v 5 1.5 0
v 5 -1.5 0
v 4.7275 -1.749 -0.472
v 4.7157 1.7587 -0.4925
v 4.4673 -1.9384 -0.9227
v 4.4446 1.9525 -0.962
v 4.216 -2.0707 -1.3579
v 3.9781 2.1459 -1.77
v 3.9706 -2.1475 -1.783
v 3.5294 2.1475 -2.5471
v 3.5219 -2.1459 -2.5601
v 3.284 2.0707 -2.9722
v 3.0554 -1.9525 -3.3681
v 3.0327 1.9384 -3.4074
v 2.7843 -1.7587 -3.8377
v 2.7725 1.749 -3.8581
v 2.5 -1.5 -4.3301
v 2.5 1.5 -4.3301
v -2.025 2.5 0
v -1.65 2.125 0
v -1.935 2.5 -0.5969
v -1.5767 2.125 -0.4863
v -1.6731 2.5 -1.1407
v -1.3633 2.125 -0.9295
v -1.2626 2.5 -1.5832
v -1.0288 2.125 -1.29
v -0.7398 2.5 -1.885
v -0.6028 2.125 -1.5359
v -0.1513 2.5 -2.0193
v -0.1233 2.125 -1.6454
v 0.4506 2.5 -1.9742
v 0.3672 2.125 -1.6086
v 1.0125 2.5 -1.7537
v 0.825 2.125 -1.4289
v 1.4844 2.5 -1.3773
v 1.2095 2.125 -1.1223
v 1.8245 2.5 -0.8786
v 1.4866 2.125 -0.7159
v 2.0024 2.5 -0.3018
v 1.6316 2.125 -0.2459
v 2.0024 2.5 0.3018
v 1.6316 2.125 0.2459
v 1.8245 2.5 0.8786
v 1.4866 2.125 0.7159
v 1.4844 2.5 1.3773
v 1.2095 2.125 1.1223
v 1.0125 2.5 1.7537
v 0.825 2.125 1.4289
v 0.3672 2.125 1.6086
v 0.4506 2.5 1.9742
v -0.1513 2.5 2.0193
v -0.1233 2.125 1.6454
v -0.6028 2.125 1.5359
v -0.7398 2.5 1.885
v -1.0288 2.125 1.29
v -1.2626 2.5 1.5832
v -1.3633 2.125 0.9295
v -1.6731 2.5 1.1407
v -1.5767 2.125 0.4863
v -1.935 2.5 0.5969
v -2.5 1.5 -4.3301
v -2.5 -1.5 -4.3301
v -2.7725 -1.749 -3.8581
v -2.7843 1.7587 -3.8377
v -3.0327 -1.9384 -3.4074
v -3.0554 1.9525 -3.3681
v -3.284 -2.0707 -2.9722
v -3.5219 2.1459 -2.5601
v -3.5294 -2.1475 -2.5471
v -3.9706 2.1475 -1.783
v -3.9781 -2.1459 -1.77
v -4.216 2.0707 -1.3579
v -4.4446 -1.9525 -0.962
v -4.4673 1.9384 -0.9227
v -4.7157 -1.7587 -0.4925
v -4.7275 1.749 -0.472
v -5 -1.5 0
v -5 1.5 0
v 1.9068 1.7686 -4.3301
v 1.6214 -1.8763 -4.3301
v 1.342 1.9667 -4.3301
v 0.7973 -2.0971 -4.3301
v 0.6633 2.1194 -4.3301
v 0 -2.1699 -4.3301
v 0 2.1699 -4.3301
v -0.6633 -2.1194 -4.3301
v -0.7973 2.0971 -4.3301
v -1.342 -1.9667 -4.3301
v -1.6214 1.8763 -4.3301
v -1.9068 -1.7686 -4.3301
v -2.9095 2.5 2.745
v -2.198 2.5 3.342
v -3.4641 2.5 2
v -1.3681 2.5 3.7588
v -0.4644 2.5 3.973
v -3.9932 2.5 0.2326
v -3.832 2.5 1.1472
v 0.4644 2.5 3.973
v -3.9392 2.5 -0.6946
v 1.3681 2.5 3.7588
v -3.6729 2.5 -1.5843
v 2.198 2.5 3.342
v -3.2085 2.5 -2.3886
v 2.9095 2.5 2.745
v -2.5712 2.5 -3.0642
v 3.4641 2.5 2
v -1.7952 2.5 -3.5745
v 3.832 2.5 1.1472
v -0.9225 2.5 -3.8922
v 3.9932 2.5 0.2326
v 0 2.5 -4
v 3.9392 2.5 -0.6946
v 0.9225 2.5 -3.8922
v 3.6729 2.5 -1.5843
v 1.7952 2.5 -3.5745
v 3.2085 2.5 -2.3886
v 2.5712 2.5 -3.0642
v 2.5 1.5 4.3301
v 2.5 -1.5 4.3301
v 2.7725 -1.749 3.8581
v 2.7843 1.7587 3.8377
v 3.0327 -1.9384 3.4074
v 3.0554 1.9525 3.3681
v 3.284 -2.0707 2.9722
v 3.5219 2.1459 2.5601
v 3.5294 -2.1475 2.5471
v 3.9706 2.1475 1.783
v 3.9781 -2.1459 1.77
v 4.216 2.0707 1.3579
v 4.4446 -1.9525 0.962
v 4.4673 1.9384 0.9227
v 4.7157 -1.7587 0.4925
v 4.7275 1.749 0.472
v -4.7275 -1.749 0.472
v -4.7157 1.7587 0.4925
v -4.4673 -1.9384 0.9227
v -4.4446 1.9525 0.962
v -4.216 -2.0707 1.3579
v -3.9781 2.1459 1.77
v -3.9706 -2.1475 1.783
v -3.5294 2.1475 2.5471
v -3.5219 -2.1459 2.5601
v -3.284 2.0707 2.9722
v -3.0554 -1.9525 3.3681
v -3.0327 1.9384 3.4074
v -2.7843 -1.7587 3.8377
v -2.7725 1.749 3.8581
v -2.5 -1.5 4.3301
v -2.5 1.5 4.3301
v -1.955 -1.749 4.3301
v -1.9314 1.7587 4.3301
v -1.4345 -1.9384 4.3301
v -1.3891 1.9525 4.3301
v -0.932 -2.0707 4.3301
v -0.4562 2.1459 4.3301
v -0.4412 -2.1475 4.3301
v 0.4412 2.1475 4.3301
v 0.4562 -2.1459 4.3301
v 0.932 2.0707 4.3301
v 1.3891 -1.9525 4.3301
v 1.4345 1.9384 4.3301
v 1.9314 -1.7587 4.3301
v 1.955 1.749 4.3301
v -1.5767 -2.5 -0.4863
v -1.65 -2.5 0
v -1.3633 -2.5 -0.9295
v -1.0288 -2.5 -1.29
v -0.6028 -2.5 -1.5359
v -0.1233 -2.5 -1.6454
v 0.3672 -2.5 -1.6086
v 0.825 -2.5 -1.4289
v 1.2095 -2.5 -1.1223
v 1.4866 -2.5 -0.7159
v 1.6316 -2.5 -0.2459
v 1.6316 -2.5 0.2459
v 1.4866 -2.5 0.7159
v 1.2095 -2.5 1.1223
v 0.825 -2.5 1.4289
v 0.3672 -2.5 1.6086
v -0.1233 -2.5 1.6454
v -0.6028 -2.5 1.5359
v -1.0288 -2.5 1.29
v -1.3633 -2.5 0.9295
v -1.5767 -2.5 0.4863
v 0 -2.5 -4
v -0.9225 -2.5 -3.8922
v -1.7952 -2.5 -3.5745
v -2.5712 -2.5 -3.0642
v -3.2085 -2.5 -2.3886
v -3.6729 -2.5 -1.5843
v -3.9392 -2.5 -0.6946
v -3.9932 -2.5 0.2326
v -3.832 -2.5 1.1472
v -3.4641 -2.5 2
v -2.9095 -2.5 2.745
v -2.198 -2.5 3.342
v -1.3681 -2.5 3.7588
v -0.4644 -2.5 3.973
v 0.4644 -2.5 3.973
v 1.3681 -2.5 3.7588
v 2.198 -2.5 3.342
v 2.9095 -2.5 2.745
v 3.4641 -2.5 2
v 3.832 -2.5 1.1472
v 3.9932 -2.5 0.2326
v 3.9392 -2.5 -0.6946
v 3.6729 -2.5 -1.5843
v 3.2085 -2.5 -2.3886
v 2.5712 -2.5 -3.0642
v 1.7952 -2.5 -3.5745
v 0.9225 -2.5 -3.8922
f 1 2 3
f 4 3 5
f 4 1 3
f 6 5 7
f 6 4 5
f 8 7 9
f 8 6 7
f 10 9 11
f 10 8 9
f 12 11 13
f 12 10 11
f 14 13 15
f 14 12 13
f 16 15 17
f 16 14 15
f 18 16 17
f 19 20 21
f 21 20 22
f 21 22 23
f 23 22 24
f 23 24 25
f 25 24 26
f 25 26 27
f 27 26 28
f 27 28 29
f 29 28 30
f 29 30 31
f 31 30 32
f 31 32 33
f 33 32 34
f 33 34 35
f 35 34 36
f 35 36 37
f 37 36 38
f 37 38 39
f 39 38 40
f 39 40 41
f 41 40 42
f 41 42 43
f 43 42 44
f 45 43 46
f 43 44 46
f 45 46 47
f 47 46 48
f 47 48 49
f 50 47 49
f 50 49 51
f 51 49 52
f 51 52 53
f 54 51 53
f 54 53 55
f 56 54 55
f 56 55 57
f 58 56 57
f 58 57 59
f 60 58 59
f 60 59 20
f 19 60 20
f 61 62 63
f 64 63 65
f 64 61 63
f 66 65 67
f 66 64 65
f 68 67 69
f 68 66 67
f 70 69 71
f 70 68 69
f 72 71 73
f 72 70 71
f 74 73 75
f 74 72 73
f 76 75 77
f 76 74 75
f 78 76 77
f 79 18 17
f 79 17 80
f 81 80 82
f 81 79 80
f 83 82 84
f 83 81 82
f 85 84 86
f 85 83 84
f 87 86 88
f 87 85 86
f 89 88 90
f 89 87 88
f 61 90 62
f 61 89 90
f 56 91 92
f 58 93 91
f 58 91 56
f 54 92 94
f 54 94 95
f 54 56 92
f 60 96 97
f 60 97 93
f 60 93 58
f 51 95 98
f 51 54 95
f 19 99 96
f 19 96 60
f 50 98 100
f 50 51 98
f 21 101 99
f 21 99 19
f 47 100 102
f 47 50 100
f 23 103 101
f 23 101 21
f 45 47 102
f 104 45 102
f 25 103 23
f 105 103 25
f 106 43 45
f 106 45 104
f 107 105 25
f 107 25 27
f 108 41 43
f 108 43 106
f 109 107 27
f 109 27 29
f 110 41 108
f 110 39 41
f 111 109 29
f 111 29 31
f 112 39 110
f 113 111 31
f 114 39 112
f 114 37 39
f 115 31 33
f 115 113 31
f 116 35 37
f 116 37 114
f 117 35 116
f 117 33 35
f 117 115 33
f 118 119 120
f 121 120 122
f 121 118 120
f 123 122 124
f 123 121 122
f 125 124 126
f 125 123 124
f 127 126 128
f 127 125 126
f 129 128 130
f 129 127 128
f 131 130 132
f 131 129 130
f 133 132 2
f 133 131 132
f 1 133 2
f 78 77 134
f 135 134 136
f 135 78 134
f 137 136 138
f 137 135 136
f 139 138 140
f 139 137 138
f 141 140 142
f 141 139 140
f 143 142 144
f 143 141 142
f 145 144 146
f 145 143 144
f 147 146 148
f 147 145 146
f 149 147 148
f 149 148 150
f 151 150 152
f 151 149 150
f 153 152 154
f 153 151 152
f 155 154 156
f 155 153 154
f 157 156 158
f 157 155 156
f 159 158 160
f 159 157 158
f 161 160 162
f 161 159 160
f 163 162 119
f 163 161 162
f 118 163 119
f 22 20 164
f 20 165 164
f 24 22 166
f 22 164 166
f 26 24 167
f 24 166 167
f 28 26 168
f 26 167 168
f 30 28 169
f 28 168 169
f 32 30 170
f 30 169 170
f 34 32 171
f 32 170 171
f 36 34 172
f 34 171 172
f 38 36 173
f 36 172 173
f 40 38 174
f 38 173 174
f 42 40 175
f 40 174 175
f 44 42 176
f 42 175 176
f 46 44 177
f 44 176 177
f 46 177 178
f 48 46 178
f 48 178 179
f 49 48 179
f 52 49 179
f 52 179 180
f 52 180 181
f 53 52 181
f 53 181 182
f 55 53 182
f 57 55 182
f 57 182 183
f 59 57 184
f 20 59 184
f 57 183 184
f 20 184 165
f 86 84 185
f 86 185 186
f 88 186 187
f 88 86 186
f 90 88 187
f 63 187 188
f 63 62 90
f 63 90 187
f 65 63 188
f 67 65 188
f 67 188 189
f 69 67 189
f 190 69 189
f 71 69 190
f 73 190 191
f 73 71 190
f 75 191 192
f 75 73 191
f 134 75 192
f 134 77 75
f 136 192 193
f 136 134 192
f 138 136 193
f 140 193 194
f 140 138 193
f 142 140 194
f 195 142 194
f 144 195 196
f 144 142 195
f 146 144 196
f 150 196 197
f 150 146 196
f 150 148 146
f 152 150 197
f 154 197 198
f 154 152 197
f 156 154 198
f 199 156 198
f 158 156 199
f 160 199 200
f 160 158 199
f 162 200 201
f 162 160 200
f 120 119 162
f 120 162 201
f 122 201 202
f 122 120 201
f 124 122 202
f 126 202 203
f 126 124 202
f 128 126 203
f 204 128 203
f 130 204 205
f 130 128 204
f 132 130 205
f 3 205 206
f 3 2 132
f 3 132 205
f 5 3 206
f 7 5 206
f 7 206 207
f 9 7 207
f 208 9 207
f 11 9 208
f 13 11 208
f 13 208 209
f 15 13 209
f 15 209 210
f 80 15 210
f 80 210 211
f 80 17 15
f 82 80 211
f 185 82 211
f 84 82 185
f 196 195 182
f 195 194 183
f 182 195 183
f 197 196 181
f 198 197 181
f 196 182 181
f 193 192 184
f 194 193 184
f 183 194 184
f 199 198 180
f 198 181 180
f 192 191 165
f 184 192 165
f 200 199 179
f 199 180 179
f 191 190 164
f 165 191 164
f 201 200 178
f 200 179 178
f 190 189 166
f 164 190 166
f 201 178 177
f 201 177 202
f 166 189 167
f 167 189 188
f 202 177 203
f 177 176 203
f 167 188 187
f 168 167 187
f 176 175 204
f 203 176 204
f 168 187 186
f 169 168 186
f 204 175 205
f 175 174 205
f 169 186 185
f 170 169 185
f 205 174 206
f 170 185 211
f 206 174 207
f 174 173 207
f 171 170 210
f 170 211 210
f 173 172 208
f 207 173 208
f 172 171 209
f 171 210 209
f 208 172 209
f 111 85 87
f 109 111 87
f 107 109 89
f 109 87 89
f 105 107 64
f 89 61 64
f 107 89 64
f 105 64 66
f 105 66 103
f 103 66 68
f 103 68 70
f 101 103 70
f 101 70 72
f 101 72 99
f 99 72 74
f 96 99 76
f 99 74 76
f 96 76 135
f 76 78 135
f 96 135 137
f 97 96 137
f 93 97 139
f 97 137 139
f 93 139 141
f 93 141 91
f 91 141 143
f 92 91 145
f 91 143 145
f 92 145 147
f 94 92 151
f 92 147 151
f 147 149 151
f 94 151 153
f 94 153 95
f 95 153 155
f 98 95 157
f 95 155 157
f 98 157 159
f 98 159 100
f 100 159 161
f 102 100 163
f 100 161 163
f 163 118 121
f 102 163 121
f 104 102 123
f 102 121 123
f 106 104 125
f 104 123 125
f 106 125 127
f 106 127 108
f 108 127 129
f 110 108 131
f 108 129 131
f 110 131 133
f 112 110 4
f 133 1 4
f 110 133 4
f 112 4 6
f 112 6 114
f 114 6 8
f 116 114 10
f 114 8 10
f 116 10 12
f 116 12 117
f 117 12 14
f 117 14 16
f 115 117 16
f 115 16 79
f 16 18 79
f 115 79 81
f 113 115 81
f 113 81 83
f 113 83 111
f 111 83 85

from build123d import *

# Parameters (mm, degrees)
BOSS_EXTRUDE1_DEPTH             = 2.5
M4X0_7_TAPPED_HOLE1_D           = 3.3
M4X0_7_TAPPED_HOLE1_DEPTH       = 9.108579979
M4X0_7_TAPPED_HOLE1_CSINK_D     = 4.05
M4X0_7_TAPPED_HOLE1_CSINK_ANGLE = 90
M4X0_7_TAPPED_HOLE1_TIP         = 0.991420021


with BuildPart() as part:
    # Sketch1 → Boss-Extrude1 (new, symmetric)
    with BuildSketch(Plane(origin=(0, 0, 0), x_dir=(1, 0, 0), z_dir=(0, 1, 0))):
        Polygon((2.5, -4.330127019), (5, 0), (2.5, 4.330127019), (-2.5, 4.330127019), (-5, 0), (-2.5, -4.330127019), align=None)
    extrude(amount=BOSS_EXTRUDE1_DEPTH, both=True)

    # Sketch2 → Cut-Revolve1 (revolve, cut)
    with BuildSketch(Plane.XY, mode=Mode.PRIVATE) as cut_revolve1_sk:
        Polygon((4, 2.5), (5, 1.5), (5, 2.5), align=None)
    cut_revolve1 = revolve(cut_revolve1_sk.sketch.rotate(Axis((0, 0, 0), (0, 1, 0)), 90), axis=Axis((0, 0, 0), (0, 1, 0)), mode=Mode.SUBTRACT)

    # Mirror1: Cut-Revolve1 across plane
    add(cut_revolve1.mirror(Plane.ZX), mode=Mode.SUBTRACT)

    # M4x0.7 Tapped Hole1
    with Locations(Plane(origin=(0, 2.5, 0), x_dir=(1, 0, 0), z_dir=(0, 1, 0))):
        with Locations((0, 0)):
            CounterSinkHole(M4X0_7_TAPPED_HOLE1_D / 2, M4X0_7_TAPPED_HOLE1_CSINK_D / 2, depth=M4X0_7_TAPPED_HOLE1_DEPTH, counter_sink_angle=M4X0_7_TAPPED_HOLE1_CSINK_ANGLE)
            with Locations((0, 0, -(M4X0_7_TAPPED_HOLE1_DEPTH + M4X0_7_TAPPED_HOLE1_TIP / 2))):  # 118° drill point
                Cone(0, M4X0_7_TAPPED_HOLE1_D / 2, M4X0_7_TAPPED_HOLE1_TIP, mode=Mode.SUBTRACT)


solid = part.part
